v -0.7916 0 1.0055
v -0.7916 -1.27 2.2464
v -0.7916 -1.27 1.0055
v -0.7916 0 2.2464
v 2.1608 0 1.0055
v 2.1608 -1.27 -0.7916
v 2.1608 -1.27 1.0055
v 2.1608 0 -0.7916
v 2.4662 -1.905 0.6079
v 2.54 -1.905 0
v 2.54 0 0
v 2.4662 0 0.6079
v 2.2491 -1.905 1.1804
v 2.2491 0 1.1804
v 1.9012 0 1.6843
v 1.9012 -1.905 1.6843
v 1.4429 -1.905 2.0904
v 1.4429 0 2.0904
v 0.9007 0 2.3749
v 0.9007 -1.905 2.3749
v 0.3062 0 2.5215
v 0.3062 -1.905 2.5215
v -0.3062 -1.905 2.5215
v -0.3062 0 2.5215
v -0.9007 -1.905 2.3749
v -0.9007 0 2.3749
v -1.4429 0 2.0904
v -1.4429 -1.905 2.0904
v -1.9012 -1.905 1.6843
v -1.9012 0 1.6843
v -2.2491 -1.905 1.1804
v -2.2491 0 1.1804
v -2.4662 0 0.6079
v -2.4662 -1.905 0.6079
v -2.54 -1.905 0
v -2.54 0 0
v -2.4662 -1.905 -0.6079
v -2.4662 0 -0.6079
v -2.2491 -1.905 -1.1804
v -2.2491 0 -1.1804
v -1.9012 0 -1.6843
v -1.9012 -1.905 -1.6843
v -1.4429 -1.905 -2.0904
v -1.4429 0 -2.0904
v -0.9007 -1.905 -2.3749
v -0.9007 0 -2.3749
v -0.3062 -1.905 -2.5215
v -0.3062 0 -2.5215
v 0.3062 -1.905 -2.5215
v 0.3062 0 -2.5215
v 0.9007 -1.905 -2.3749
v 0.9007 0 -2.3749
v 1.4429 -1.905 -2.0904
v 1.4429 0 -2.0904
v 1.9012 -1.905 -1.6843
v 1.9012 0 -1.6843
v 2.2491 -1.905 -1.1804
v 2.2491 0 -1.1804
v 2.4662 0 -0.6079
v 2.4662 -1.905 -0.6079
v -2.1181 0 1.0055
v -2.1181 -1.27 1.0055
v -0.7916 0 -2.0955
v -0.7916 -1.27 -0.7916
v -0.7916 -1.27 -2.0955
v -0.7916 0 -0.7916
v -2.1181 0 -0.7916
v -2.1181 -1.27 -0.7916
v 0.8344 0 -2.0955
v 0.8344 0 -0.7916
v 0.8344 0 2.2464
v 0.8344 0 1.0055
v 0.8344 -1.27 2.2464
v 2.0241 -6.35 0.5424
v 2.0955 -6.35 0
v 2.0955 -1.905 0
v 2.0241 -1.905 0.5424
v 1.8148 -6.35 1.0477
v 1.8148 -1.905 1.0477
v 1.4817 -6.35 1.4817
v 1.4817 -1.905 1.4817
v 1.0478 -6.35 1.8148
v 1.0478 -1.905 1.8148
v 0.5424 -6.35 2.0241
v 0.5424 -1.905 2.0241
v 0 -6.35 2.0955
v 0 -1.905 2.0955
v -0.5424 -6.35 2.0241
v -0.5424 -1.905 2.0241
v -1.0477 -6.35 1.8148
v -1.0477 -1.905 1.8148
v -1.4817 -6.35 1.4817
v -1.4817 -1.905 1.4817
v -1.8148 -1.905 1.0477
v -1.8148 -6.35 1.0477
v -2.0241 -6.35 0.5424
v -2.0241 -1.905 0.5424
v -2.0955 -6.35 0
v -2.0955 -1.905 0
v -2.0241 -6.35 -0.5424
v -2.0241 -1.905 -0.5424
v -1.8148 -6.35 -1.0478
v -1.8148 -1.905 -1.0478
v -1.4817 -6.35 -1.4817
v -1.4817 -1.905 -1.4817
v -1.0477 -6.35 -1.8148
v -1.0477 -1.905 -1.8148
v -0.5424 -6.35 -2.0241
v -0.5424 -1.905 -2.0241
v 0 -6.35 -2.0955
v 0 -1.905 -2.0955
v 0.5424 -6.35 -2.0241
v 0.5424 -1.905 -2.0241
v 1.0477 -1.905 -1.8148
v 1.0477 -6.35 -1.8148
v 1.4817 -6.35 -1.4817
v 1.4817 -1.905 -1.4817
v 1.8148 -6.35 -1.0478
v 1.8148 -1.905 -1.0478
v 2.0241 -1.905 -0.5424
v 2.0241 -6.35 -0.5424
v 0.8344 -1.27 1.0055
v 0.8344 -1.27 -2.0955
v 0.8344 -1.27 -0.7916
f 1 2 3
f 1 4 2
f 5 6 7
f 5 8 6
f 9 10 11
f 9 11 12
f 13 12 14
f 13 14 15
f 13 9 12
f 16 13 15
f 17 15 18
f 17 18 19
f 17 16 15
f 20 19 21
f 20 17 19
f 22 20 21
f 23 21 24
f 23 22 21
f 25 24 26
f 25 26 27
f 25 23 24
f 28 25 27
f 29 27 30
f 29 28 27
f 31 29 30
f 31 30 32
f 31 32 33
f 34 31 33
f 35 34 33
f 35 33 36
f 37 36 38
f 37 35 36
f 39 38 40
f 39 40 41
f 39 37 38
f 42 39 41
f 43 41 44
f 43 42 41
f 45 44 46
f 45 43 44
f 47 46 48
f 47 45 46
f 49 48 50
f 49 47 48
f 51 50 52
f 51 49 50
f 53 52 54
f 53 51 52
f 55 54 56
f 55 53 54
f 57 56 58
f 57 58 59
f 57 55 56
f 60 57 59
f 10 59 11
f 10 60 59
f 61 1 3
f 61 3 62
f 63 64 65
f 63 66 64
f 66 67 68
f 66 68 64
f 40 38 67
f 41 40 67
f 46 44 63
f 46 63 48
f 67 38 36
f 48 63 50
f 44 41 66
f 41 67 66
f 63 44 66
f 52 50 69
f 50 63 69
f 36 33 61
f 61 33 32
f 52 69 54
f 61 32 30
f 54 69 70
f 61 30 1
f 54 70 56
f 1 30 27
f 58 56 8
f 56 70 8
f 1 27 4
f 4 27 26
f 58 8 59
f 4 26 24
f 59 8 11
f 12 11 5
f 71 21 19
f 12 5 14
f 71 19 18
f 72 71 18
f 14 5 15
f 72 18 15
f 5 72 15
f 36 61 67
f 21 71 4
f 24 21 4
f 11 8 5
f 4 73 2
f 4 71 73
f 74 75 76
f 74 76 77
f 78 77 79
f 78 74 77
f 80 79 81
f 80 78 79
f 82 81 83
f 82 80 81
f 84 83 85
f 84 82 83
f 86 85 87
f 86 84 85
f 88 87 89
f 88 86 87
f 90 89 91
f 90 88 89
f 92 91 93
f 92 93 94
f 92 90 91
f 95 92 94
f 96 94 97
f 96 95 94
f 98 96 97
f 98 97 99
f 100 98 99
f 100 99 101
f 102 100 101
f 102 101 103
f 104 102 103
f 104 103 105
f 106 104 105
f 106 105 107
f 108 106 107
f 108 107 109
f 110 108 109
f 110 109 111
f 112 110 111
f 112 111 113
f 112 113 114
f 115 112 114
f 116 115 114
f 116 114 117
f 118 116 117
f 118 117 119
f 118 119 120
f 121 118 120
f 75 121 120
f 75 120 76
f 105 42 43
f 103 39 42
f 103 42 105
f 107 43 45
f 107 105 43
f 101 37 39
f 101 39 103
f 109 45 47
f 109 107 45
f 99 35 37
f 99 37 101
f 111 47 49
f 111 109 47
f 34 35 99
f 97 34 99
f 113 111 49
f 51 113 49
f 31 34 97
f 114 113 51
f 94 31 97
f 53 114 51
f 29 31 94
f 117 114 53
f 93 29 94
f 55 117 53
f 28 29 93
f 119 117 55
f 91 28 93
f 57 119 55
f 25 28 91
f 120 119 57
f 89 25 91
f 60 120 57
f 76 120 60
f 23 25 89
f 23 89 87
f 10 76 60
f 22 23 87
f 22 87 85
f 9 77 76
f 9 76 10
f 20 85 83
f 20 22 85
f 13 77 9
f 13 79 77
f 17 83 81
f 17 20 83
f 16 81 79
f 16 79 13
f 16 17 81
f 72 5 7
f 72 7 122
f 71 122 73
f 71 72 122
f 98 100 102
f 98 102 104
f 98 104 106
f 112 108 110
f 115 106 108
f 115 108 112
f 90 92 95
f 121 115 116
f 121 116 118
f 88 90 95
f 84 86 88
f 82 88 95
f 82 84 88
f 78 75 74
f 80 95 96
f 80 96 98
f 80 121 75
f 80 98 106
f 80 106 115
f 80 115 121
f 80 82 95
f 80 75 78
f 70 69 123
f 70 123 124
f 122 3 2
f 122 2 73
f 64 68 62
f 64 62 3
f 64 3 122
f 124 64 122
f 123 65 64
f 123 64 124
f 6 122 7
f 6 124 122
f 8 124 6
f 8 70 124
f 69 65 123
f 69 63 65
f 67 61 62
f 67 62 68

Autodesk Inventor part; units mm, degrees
ref_plane "YZ Plane" through (0, 0, 0) normal (1, 0, 0) x (0, 1, 0)
ref_plane "XZ Plane" through (0, 0, 0) normal (0, 1, 0) x (-1, 0, 0)
ref_plane "XY Plane" through (0, 0, 0) normal (0, 0, 1) x (1, 0, 0)
sketch "Sketch1" plane through (0, 0, 0) normal (0, 0, 1) x (1, 0, 0)
  line L0 (0, 0) -> (2.54, 0)
  line L1 (2.54, 0) -> (2.54, -1.905)
  line L2 (2.54, -1.905) -> (2.0955, -1.905)
  line L3 (2.0955, -1.905) -> (2.0955, -6.35)
  line L4 (2.0955, -6.35) -> (0, -6.35)
  line L5 (0, -6.35) -> (0, 0)
  line L6 (0, 0) -> (0, -8.8327)
  dimension "d0" = 2.54
  dimension "d1" = 1.905
  dimension "d2" = 0.4445
  dimension "d3" = 4.445
revolve "Revolution1" add sketch "Sketch1" angle 360 about axis through (0, 0, 0) along (0, -1, 0)
thread "Thread1" size "5-40 UNC" class "2A" standard "ANSI Unified Screw Threads" full length
sketch "Sketch2" plane through (0, 0, 0) normal (0, 1, 0) x (1, 0, 0)
  line L0 (2.1608, 0.7916) -> (2.1608, -1.0055)
  line L1 (-2.1181, -1.0055) -> (-2.1181, 0.7916)
  line L2 (-0.7916, 2.0955) -> (0.8344, 2.0955)
  line L3 (0.8344, -2.2464) -> (-0.7916, -2.2464)
  line L4 (-0.7916, -2.2464) -> (-0.7916, -1.0055)
  line L5 (-0.7916, 0.7916) -> (-0.7916, 2.0955)
  line L6 (-2.1181, 0.7916) -> (-0.7916, 0.7916)
  line L7 (0.8344, 0.7916) -> (2.1608, 0.7916)
  line L8 (0.8344, 2.0955) -> (0.8344, 0.7916)
  line L9 (0.8344, -1.0055) -> (0.8344, -2.2464)
  line L10 (2.1608, -1.0055) -> (0.8344, -1.0055)
  line L11 (-0.7916, -1.0055) -> (-2.1181, -1.0055)
  point P0 (0, 0)
extrude "Extrusion1" cut sketch "Sketch2" against normal blind 1.27
properties part number "sqrew for baring stand" material "Aluminum 6061"
